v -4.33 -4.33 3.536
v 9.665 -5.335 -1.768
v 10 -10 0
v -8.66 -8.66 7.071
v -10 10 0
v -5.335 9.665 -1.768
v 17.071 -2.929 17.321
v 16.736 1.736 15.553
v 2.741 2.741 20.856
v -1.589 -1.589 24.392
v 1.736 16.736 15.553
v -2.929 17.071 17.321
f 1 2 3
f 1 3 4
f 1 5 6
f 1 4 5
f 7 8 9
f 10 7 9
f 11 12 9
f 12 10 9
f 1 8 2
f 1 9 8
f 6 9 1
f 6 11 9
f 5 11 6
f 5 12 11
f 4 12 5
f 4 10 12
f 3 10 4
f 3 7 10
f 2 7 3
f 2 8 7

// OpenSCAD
rotate(a=30,v=[-1,1,0]) {
    linear_extrude(height=20) {
        difference() {
            square(20, center=true);
            translate([-5,-5]) {
                square(30);
            }
        }
    }
}
